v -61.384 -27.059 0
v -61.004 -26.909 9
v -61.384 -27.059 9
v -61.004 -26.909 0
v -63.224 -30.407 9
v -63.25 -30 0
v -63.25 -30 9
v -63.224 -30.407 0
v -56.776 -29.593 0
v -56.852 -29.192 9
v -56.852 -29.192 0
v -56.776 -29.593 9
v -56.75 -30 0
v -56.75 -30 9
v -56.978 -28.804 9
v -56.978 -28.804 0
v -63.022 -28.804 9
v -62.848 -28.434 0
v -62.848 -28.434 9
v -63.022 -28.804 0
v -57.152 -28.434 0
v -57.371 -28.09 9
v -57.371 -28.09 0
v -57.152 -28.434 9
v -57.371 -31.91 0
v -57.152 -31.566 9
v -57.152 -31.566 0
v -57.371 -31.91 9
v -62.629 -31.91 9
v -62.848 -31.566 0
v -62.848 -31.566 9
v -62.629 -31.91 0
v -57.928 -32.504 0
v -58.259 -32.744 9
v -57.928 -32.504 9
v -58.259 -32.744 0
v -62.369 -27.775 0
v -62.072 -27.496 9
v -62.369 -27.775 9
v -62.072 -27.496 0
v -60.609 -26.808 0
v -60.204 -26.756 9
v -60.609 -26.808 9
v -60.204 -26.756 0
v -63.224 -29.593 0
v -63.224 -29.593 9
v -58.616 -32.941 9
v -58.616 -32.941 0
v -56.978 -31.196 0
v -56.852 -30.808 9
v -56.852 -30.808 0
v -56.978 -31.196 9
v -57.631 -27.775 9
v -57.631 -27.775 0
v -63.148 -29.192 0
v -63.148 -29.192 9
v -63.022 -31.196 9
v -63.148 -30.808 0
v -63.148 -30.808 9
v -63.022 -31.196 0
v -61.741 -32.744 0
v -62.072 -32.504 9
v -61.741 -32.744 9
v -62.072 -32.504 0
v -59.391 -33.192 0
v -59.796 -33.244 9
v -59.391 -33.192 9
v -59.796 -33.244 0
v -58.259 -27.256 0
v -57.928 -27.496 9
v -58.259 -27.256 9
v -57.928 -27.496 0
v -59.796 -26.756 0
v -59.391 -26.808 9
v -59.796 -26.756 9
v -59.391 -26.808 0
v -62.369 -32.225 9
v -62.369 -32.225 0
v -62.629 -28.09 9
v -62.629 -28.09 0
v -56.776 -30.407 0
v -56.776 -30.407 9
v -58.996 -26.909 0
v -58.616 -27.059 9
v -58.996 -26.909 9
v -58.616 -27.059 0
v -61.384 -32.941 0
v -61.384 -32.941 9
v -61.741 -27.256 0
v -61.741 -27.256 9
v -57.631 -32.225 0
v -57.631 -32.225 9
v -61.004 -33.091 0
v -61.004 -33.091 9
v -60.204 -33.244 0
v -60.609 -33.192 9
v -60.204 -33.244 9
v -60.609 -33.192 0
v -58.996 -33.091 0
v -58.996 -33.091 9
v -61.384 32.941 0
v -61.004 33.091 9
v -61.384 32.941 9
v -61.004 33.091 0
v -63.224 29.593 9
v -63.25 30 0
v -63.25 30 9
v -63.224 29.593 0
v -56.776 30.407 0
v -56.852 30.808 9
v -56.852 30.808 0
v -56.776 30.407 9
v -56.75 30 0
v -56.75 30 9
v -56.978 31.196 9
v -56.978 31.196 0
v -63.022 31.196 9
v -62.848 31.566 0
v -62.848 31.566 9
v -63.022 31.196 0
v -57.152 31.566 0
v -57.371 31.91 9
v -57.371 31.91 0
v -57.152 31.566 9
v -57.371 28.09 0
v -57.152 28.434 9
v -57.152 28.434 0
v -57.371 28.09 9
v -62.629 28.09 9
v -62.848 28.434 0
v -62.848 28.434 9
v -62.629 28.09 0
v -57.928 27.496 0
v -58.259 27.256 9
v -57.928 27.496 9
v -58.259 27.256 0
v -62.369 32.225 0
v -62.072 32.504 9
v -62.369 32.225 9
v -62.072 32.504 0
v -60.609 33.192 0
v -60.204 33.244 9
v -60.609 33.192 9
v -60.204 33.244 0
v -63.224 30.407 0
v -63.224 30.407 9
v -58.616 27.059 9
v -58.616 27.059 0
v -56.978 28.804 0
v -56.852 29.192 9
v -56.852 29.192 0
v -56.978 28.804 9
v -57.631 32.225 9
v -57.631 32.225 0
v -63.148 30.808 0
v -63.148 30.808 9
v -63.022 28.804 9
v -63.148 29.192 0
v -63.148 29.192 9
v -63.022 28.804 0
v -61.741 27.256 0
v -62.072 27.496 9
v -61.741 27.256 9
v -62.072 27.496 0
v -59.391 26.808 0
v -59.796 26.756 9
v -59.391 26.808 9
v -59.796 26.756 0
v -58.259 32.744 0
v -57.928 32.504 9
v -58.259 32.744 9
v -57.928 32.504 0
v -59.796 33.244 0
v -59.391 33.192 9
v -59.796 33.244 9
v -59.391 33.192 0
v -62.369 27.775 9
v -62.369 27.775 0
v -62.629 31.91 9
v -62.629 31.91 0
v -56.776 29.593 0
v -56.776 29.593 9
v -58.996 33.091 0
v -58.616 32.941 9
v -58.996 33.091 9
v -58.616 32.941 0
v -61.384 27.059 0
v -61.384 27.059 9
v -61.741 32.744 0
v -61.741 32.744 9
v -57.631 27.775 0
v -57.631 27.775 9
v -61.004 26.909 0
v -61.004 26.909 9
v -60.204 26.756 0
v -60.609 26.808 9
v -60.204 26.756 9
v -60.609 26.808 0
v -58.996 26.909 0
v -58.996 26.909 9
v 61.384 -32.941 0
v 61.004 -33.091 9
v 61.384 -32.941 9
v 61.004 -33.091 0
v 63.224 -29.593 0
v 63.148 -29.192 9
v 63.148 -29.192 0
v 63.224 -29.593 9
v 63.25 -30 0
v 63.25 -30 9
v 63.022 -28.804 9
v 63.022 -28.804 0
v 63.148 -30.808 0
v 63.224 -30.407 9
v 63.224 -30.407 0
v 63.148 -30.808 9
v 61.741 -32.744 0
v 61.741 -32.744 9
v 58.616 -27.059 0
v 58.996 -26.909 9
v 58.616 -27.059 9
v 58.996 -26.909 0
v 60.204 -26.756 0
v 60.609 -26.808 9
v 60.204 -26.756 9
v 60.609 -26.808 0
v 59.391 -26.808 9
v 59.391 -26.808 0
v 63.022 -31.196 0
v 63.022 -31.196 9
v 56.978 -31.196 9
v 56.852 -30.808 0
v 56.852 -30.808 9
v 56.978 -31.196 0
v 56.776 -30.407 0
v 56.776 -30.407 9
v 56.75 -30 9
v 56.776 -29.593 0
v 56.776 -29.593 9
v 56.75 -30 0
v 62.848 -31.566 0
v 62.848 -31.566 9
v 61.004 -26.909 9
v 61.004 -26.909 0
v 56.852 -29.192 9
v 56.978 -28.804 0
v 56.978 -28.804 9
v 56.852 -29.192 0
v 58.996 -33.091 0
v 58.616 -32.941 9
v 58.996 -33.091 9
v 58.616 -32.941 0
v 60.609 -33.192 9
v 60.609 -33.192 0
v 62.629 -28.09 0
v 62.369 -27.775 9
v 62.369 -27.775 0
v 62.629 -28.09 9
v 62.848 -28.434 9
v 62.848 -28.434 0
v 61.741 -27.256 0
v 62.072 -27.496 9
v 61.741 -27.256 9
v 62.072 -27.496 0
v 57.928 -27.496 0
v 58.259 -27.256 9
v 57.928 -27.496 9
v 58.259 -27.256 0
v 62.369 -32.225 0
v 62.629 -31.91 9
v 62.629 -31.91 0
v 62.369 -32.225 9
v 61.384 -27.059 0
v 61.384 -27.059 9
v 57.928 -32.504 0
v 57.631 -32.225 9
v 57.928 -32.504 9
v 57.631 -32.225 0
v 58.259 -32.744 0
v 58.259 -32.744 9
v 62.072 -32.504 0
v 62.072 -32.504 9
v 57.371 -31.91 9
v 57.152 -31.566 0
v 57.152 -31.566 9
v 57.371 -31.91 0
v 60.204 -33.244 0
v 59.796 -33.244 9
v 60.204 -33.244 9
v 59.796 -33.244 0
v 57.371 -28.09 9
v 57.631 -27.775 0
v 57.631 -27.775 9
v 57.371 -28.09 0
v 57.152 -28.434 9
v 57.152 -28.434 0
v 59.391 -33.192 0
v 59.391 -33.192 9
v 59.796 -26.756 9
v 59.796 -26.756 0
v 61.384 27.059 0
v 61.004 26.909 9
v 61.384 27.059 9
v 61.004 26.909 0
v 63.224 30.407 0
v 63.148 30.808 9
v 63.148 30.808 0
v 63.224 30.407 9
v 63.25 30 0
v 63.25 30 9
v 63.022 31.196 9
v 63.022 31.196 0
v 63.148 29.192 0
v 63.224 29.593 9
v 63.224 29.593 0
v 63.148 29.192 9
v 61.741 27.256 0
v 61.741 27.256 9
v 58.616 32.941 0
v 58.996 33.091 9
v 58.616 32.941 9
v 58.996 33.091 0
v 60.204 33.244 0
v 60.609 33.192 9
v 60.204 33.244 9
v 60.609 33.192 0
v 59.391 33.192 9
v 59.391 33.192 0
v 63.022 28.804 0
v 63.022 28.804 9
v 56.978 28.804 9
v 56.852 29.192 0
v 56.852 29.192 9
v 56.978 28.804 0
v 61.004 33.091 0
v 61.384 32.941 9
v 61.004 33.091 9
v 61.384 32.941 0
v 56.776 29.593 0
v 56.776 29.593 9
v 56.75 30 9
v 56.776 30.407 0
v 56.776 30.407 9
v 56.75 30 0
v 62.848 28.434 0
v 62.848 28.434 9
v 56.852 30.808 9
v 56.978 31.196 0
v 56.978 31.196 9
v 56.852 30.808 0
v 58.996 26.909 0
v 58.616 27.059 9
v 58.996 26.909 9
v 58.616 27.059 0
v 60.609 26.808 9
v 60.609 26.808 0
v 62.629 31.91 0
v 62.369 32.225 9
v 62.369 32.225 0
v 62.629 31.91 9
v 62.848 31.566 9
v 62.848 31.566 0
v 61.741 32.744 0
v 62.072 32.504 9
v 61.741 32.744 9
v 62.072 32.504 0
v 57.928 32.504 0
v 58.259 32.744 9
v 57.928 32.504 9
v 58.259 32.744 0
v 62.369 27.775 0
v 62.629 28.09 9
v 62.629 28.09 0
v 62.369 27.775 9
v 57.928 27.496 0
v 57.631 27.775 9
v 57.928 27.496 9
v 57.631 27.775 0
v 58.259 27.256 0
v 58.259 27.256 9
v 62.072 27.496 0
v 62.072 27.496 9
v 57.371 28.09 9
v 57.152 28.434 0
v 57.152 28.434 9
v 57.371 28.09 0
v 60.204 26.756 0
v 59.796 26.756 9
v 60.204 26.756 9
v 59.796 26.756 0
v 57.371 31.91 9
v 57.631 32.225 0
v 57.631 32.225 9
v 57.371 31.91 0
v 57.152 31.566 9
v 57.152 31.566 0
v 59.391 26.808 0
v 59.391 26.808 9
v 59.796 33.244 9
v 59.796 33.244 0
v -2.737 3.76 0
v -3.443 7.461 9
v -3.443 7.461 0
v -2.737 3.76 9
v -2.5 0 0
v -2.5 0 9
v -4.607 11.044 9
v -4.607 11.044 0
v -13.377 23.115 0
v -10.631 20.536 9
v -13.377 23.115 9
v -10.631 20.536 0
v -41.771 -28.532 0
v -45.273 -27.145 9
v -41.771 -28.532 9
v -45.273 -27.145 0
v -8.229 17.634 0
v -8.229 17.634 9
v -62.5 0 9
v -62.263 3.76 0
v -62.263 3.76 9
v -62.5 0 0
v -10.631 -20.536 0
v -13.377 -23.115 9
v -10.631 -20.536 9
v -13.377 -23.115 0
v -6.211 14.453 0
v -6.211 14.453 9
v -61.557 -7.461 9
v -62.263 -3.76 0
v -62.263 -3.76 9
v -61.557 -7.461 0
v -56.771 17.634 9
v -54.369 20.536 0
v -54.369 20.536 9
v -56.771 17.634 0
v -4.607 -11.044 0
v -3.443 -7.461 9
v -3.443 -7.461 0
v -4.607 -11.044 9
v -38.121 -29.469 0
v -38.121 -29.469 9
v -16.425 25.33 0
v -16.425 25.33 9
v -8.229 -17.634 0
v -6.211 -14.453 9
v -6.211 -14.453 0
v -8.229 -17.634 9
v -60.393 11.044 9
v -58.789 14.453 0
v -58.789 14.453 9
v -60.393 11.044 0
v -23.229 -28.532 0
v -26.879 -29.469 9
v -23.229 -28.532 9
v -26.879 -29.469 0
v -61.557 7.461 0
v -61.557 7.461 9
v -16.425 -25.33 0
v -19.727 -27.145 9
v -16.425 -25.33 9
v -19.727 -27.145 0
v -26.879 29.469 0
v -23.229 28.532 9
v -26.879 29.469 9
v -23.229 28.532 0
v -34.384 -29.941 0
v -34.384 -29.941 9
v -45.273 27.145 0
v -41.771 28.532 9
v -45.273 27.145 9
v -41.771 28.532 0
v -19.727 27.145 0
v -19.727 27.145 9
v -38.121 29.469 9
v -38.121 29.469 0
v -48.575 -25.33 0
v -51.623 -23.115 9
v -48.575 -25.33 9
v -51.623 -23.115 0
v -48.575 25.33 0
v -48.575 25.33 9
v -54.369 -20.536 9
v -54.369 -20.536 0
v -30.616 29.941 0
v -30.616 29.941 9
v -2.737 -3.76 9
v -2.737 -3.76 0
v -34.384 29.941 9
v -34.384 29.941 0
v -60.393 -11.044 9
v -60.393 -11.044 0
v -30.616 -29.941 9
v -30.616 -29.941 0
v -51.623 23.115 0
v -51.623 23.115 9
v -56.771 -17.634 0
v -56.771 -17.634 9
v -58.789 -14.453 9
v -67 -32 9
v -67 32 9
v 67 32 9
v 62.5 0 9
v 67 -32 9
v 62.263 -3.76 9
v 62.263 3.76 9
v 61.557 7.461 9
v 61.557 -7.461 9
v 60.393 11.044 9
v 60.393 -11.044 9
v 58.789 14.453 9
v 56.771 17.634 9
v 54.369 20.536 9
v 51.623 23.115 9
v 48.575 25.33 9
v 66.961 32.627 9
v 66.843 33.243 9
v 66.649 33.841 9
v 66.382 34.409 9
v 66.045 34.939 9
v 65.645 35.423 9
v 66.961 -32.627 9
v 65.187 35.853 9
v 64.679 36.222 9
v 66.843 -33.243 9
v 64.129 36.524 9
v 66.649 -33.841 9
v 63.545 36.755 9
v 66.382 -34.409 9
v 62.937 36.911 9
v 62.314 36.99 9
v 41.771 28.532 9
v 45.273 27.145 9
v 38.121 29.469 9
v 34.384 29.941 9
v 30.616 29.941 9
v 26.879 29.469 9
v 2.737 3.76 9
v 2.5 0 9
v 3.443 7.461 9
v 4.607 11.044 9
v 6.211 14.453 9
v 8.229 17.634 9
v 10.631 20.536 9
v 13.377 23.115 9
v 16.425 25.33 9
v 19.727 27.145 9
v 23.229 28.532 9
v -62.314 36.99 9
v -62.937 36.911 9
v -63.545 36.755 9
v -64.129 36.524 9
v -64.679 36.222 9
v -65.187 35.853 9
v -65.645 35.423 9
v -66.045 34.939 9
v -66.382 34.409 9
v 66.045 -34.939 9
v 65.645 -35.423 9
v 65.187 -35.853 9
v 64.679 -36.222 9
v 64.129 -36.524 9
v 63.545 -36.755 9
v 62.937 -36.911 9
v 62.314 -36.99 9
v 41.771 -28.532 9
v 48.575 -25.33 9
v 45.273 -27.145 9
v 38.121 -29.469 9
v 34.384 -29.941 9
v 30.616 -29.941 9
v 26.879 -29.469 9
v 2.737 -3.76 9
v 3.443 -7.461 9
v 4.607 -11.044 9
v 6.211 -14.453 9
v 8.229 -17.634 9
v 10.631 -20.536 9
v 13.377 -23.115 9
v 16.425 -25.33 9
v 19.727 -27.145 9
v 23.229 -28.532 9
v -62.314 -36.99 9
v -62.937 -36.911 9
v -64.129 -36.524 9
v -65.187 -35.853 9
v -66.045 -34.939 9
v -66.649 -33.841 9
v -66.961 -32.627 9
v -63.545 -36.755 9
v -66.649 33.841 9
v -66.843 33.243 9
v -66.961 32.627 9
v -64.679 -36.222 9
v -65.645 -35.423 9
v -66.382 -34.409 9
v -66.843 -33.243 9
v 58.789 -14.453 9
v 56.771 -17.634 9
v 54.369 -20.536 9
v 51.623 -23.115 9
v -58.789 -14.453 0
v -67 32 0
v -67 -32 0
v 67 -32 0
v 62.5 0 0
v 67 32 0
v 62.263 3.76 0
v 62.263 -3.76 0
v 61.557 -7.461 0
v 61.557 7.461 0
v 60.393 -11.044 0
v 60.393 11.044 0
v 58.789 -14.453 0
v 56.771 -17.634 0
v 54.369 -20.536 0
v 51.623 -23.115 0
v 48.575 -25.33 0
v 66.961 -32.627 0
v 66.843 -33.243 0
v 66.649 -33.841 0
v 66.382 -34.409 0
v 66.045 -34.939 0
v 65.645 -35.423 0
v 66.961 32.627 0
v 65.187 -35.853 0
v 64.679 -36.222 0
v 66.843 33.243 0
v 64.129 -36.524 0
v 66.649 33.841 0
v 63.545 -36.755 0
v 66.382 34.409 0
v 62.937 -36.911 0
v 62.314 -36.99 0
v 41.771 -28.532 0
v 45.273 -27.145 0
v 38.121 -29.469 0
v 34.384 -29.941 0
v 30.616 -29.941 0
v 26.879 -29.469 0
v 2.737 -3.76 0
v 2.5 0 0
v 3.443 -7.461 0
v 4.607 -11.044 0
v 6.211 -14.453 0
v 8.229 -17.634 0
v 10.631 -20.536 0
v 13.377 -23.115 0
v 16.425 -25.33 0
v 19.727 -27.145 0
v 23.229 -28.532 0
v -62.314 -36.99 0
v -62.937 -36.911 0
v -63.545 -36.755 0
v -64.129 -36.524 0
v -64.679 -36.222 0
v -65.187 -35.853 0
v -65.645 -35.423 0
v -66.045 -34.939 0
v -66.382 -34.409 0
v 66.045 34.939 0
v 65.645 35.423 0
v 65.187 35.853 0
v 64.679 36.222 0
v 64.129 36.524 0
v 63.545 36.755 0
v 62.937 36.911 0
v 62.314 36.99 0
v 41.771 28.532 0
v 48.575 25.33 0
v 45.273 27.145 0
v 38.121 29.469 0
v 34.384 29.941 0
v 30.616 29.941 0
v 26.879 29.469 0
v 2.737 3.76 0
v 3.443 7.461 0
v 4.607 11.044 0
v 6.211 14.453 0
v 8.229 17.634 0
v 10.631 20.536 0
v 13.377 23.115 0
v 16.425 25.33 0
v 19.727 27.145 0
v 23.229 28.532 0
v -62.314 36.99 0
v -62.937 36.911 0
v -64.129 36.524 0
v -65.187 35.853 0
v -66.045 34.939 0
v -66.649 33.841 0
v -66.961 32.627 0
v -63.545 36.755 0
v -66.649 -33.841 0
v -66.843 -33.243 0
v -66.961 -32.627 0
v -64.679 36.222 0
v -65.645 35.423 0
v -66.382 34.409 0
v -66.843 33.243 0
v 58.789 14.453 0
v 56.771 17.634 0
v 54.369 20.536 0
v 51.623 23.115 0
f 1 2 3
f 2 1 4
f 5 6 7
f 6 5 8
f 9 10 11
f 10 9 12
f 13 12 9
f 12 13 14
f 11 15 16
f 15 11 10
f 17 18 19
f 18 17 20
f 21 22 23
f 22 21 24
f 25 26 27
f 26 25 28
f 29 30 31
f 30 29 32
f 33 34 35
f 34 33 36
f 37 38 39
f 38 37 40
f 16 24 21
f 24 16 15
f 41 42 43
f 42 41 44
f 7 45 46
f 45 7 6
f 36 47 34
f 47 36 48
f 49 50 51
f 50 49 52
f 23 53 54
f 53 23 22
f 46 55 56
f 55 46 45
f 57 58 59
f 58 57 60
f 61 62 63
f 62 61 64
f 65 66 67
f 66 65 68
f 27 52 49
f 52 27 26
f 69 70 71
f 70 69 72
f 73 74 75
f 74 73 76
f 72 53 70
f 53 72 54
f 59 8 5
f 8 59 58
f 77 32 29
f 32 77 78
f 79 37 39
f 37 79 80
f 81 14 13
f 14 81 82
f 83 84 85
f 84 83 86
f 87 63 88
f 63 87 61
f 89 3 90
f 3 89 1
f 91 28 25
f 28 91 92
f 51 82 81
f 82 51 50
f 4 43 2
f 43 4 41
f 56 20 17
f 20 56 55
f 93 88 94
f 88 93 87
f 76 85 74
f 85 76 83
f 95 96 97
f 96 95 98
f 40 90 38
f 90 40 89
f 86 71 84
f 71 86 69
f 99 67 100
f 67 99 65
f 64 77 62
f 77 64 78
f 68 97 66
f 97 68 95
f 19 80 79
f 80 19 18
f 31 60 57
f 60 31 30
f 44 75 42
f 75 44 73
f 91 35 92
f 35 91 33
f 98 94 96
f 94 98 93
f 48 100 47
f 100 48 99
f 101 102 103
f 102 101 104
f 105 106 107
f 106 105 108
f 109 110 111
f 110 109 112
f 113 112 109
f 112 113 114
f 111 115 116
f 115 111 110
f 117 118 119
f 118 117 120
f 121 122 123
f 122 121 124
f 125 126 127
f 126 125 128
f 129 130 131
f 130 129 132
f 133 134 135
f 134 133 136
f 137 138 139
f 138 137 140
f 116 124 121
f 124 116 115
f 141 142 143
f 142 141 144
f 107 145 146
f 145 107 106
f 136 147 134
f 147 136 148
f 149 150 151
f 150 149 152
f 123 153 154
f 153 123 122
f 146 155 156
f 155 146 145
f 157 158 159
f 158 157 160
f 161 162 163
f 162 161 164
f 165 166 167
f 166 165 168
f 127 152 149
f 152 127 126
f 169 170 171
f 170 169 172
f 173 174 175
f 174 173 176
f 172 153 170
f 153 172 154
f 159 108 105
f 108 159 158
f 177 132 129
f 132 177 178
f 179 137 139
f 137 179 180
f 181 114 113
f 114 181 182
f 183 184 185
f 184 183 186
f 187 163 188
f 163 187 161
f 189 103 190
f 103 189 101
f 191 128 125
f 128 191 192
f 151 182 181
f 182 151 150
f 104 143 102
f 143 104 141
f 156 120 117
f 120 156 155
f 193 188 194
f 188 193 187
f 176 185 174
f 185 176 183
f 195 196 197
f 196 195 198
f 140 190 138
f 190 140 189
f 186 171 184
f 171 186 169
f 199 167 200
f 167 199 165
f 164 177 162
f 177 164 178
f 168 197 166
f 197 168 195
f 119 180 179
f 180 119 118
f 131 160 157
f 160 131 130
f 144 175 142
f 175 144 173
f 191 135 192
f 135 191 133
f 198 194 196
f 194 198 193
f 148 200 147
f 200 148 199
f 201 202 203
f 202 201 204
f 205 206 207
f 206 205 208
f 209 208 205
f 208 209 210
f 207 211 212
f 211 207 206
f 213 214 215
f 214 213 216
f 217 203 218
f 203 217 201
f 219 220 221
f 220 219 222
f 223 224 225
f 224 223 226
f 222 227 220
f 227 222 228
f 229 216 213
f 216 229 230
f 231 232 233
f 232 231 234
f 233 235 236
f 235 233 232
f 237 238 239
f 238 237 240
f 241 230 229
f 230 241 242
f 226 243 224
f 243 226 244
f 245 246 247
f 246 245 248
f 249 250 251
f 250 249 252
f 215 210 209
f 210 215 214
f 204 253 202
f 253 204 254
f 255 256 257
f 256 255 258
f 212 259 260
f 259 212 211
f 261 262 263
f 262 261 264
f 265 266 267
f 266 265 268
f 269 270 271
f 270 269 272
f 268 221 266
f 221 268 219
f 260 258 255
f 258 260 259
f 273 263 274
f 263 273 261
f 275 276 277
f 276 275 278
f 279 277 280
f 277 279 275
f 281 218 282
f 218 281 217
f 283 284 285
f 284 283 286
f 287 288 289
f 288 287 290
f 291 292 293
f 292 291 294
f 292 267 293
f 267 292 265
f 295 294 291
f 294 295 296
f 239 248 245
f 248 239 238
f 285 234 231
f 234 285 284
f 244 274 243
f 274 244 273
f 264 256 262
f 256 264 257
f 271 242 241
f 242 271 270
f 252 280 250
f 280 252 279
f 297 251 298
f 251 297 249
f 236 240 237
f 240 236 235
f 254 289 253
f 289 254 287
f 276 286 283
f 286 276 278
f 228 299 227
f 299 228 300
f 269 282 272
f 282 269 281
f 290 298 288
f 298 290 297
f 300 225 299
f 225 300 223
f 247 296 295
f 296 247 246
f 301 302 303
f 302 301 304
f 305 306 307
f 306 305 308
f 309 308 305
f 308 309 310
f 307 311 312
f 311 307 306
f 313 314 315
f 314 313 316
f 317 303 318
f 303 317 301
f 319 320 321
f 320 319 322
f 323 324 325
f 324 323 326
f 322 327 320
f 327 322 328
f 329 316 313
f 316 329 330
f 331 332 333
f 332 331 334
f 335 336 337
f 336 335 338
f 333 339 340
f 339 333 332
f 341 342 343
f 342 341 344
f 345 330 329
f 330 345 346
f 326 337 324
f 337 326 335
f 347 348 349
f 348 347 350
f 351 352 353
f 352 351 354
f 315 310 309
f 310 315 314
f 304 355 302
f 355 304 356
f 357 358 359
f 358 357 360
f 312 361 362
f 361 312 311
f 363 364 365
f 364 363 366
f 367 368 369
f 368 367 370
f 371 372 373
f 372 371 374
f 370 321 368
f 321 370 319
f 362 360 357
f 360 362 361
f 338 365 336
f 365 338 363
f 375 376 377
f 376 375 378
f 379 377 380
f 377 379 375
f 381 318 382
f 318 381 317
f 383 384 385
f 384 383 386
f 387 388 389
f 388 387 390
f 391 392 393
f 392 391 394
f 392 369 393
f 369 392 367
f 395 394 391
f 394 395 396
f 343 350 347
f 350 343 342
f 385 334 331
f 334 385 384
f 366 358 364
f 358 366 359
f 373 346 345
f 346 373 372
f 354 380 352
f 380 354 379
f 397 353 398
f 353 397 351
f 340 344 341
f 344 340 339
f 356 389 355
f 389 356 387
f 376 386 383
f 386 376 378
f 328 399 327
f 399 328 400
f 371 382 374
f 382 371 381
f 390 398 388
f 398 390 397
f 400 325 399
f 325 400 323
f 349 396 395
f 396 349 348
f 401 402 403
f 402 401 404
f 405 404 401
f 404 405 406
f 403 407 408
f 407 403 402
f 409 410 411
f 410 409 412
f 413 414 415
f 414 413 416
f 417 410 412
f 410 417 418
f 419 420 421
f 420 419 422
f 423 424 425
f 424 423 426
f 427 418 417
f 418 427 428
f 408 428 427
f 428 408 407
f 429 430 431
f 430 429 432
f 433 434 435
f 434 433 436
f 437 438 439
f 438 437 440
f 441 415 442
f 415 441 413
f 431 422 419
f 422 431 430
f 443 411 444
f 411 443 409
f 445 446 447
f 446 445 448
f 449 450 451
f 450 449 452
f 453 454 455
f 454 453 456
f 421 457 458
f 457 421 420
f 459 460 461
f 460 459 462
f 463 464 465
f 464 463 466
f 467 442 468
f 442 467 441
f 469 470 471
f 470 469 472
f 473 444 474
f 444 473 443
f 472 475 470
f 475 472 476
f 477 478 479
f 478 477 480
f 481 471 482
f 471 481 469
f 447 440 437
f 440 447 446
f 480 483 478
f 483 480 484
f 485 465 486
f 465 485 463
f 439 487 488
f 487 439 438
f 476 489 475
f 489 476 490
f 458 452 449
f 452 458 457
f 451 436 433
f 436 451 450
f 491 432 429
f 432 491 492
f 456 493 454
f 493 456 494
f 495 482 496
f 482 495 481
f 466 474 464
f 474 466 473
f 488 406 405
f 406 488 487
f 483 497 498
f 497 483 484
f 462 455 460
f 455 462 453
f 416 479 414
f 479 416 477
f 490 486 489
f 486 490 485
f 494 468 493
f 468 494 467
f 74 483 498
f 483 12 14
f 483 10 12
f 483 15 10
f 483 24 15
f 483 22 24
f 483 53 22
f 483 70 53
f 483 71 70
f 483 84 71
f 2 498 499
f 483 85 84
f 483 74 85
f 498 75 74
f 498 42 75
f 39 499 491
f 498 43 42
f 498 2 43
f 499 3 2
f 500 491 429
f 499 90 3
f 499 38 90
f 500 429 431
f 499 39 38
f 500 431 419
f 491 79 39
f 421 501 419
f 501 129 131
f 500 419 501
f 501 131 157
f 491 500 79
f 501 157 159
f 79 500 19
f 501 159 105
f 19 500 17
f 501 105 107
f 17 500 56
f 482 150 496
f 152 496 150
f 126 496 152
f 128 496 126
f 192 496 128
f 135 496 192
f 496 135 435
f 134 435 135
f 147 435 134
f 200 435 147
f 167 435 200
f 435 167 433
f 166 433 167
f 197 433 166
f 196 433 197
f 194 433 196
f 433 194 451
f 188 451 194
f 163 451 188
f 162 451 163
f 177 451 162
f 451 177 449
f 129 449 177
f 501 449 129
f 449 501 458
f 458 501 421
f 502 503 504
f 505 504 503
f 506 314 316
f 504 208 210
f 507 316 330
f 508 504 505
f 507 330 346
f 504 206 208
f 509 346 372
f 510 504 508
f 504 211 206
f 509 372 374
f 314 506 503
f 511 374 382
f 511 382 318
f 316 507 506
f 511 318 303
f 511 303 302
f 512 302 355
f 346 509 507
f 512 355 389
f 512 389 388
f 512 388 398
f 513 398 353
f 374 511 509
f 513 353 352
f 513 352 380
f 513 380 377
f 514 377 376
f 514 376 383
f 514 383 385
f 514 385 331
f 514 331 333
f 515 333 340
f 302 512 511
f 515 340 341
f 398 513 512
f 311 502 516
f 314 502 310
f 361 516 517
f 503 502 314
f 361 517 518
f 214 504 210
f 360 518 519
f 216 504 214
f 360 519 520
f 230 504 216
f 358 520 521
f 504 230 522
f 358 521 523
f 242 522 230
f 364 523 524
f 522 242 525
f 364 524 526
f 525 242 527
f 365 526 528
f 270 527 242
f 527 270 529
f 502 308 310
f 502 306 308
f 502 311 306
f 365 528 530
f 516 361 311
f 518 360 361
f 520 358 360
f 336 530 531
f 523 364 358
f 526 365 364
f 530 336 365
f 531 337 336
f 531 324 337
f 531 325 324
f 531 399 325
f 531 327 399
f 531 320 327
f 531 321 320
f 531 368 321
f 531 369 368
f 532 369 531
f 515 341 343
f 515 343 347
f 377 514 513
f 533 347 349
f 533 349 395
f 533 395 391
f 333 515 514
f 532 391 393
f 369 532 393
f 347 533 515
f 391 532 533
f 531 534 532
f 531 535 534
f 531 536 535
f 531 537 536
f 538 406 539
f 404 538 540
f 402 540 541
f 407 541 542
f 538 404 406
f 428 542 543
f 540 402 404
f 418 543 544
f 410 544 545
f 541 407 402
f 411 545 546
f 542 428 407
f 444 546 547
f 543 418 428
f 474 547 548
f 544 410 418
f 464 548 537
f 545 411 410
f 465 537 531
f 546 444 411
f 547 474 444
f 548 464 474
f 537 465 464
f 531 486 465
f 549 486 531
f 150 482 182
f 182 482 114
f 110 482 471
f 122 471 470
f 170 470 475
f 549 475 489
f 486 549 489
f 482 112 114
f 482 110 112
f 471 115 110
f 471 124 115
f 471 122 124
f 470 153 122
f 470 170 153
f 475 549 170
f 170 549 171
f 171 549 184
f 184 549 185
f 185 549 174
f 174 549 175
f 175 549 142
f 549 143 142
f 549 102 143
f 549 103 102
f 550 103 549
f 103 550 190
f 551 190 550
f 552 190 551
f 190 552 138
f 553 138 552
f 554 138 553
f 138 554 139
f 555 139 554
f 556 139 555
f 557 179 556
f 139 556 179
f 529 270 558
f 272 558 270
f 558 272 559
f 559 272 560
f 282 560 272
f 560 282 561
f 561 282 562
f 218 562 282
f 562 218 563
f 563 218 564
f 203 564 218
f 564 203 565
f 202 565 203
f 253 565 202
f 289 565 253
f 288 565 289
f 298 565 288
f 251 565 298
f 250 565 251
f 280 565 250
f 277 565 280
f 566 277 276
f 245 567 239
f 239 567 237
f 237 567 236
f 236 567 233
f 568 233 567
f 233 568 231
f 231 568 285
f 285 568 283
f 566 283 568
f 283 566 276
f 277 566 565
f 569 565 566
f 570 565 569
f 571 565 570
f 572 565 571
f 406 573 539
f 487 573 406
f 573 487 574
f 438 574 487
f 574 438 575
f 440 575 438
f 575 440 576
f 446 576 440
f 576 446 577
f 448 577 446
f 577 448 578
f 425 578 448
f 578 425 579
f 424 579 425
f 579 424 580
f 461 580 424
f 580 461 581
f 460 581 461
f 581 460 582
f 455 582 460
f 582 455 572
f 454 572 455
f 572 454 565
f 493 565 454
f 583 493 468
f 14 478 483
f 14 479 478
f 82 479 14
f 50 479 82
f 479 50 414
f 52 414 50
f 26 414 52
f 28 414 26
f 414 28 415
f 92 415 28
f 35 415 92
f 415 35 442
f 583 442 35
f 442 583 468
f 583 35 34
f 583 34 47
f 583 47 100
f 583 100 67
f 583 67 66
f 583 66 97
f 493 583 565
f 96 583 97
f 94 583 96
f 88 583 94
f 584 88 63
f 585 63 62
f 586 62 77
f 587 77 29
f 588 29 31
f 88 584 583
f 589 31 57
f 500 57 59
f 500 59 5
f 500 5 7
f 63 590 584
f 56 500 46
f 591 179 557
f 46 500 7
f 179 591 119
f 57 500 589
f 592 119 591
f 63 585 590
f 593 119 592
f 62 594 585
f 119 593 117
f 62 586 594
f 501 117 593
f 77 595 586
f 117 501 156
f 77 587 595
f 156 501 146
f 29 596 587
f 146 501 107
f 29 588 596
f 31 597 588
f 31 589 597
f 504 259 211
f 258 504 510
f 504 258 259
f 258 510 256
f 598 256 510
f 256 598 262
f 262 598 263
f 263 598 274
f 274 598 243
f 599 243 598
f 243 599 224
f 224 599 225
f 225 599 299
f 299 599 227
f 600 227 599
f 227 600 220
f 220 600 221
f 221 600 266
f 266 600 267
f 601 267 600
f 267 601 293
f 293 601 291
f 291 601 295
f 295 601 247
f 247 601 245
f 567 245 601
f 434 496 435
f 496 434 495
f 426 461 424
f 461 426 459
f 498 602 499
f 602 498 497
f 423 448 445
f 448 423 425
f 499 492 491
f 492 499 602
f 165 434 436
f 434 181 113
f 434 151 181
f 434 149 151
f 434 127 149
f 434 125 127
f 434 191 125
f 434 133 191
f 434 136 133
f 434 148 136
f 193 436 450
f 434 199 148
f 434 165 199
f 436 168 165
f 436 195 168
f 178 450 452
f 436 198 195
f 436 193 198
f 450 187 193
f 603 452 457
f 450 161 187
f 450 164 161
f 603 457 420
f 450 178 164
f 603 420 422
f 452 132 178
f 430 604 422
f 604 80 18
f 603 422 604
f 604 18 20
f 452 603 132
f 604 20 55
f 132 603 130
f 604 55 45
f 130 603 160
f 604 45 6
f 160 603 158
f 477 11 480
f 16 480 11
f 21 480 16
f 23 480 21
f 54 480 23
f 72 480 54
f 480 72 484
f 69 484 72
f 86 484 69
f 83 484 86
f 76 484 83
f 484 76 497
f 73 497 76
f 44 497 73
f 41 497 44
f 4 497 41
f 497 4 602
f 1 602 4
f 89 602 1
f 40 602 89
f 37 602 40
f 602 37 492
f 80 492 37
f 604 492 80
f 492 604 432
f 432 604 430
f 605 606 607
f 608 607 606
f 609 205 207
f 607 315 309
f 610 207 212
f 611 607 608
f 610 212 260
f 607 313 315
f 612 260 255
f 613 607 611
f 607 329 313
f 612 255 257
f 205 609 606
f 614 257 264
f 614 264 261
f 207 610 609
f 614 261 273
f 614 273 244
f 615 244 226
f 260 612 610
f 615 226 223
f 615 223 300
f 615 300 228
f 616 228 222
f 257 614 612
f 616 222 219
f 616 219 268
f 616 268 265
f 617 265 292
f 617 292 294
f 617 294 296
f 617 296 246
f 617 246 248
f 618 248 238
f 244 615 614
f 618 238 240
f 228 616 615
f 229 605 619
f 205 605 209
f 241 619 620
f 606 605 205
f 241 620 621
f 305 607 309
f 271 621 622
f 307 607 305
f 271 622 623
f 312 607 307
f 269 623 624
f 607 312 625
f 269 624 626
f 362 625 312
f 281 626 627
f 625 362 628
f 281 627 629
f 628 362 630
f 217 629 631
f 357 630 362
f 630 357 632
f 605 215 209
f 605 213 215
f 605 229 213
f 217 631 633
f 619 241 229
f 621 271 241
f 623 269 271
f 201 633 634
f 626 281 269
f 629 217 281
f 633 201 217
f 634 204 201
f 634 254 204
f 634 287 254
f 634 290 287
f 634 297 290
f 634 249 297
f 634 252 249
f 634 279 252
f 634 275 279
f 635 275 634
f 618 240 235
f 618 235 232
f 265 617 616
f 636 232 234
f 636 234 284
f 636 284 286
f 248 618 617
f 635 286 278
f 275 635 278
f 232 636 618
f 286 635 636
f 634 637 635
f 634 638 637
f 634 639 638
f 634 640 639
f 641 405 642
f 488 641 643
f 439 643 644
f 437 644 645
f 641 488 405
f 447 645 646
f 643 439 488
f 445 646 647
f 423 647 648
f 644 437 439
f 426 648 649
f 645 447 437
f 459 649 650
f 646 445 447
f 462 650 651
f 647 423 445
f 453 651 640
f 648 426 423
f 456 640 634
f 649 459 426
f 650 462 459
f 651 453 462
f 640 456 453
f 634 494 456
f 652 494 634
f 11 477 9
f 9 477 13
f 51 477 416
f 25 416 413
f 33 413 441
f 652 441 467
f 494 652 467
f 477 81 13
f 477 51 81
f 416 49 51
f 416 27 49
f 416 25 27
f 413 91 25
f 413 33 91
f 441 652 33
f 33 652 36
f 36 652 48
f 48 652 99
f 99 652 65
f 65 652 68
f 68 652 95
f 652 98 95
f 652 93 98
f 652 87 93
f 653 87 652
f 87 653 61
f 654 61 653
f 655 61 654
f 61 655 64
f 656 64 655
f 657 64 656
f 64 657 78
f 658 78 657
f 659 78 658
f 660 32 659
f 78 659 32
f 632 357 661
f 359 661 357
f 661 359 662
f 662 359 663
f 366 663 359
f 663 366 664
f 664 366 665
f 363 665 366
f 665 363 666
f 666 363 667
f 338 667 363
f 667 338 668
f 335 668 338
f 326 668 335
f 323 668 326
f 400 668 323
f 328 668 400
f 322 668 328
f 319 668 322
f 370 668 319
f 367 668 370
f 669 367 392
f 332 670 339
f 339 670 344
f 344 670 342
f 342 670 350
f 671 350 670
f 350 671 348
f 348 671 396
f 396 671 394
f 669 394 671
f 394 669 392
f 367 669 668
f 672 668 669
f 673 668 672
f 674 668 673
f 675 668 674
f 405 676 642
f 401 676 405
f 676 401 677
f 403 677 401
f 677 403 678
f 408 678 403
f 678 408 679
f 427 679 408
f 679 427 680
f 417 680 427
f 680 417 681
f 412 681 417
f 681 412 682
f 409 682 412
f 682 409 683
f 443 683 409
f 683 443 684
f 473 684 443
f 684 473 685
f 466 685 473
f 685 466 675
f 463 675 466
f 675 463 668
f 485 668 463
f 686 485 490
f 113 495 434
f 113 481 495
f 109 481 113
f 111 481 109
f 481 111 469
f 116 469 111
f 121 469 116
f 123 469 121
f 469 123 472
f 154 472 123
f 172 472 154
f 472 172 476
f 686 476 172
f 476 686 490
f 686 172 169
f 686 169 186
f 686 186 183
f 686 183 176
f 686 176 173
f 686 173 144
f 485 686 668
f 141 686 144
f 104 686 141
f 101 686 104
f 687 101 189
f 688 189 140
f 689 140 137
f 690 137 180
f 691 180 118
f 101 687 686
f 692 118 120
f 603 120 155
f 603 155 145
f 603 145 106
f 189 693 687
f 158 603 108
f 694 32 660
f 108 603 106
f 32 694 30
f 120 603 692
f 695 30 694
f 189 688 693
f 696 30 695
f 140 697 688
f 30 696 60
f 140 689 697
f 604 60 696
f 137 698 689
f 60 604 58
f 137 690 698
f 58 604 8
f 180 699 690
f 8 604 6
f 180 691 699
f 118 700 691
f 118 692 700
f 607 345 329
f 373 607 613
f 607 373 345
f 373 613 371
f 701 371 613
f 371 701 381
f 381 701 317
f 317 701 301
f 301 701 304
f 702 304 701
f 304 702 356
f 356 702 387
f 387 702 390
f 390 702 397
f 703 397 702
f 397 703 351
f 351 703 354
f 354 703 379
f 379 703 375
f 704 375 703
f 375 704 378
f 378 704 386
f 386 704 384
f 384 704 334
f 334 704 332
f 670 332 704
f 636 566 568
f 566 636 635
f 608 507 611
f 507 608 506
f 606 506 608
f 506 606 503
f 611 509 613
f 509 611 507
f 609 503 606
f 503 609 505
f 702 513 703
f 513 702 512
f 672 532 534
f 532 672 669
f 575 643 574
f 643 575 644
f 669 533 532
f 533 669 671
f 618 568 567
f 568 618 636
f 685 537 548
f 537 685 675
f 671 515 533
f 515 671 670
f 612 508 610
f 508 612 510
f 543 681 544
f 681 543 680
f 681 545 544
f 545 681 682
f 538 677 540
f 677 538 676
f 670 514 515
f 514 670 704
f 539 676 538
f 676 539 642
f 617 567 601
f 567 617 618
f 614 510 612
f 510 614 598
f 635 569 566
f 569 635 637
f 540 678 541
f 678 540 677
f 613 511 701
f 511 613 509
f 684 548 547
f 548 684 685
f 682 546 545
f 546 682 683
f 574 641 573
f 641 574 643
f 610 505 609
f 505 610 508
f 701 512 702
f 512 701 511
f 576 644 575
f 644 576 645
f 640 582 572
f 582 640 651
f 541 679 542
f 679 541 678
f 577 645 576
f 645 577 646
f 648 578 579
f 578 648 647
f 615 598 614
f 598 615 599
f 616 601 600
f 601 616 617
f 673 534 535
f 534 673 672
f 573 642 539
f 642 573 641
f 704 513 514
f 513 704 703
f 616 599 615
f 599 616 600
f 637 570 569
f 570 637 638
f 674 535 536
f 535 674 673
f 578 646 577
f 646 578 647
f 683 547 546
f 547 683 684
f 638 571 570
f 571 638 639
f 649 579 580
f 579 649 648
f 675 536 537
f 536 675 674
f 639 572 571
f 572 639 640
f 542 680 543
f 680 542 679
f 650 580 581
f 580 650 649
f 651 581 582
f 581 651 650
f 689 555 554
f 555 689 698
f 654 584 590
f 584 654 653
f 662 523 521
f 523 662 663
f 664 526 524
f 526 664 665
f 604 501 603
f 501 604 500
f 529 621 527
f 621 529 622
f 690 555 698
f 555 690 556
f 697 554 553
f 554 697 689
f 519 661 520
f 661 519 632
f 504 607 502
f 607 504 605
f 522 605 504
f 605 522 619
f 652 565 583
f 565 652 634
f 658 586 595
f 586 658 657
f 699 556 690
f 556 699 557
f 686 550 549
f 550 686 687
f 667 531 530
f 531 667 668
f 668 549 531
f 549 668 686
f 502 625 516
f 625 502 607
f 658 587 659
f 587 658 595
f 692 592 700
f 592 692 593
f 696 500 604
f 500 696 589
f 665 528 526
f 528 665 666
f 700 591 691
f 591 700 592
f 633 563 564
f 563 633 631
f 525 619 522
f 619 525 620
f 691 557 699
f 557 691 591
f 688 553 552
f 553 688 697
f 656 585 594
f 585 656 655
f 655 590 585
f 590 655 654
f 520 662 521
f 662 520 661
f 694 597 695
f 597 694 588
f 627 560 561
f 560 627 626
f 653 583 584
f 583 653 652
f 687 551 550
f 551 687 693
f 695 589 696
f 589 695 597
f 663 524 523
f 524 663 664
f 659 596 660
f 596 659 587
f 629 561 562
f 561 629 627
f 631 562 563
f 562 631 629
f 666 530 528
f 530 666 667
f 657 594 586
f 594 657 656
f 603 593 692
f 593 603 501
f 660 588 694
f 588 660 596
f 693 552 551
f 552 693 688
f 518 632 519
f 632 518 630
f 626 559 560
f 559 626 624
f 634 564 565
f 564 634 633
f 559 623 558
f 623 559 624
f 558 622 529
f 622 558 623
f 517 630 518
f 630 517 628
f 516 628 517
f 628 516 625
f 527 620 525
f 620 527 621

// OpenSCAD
$fn = 50;


difference() {
	union() {
		hull() {
			translate(v = [-62.0000000000, 32.0000000000, 0]) {
				cylinder(h = 9, r = 5);
			}
			translate(v = [62.0000000000, 32.0000000000, 0]) {
				cylinder(h = 9, r = 5);
			}
			translate(v = [-62.0000000000, -32.0000000000, 0]) {
				cylinder(h = 9, r = 5);
			}
			translate(v = [62.0000000000, -32.0000000000, 0]) {
				cylinder(h = 9, r = 5);
			}
		}
	}
	union() {
		#translate(v = [-60.0000000000, -30.0000000000, -100.0000000000]) {
			cylinder(h = 200, r = 3.2500000000);
		}
		#translate(v = [-60.0000000000, 30.0000000000, -100.0000000000]) {
			cylinder(h = 200, r = 3.2500000000);
		}
		#translate(v = [60.0000000000, -30.0000000000, -100.0000000000]) {
			cylinder(h = 200, r = 3.2500000000);
		}
		#translate(v = [60.0000000000, 30.0000000000, -100.0000000000]) {
			cylinder(h = 200, r = 3.2500000000);
		}
		#translate(v = [-32.5000000000, 0, 0]) {
			cylinder(h = 9, r = 30.0000000000);
		}
		#translate(v = [32.5000000000, 0, 0]) {
			cylinder(h = 9, r = 30.0000000000);
		}
	}
}
